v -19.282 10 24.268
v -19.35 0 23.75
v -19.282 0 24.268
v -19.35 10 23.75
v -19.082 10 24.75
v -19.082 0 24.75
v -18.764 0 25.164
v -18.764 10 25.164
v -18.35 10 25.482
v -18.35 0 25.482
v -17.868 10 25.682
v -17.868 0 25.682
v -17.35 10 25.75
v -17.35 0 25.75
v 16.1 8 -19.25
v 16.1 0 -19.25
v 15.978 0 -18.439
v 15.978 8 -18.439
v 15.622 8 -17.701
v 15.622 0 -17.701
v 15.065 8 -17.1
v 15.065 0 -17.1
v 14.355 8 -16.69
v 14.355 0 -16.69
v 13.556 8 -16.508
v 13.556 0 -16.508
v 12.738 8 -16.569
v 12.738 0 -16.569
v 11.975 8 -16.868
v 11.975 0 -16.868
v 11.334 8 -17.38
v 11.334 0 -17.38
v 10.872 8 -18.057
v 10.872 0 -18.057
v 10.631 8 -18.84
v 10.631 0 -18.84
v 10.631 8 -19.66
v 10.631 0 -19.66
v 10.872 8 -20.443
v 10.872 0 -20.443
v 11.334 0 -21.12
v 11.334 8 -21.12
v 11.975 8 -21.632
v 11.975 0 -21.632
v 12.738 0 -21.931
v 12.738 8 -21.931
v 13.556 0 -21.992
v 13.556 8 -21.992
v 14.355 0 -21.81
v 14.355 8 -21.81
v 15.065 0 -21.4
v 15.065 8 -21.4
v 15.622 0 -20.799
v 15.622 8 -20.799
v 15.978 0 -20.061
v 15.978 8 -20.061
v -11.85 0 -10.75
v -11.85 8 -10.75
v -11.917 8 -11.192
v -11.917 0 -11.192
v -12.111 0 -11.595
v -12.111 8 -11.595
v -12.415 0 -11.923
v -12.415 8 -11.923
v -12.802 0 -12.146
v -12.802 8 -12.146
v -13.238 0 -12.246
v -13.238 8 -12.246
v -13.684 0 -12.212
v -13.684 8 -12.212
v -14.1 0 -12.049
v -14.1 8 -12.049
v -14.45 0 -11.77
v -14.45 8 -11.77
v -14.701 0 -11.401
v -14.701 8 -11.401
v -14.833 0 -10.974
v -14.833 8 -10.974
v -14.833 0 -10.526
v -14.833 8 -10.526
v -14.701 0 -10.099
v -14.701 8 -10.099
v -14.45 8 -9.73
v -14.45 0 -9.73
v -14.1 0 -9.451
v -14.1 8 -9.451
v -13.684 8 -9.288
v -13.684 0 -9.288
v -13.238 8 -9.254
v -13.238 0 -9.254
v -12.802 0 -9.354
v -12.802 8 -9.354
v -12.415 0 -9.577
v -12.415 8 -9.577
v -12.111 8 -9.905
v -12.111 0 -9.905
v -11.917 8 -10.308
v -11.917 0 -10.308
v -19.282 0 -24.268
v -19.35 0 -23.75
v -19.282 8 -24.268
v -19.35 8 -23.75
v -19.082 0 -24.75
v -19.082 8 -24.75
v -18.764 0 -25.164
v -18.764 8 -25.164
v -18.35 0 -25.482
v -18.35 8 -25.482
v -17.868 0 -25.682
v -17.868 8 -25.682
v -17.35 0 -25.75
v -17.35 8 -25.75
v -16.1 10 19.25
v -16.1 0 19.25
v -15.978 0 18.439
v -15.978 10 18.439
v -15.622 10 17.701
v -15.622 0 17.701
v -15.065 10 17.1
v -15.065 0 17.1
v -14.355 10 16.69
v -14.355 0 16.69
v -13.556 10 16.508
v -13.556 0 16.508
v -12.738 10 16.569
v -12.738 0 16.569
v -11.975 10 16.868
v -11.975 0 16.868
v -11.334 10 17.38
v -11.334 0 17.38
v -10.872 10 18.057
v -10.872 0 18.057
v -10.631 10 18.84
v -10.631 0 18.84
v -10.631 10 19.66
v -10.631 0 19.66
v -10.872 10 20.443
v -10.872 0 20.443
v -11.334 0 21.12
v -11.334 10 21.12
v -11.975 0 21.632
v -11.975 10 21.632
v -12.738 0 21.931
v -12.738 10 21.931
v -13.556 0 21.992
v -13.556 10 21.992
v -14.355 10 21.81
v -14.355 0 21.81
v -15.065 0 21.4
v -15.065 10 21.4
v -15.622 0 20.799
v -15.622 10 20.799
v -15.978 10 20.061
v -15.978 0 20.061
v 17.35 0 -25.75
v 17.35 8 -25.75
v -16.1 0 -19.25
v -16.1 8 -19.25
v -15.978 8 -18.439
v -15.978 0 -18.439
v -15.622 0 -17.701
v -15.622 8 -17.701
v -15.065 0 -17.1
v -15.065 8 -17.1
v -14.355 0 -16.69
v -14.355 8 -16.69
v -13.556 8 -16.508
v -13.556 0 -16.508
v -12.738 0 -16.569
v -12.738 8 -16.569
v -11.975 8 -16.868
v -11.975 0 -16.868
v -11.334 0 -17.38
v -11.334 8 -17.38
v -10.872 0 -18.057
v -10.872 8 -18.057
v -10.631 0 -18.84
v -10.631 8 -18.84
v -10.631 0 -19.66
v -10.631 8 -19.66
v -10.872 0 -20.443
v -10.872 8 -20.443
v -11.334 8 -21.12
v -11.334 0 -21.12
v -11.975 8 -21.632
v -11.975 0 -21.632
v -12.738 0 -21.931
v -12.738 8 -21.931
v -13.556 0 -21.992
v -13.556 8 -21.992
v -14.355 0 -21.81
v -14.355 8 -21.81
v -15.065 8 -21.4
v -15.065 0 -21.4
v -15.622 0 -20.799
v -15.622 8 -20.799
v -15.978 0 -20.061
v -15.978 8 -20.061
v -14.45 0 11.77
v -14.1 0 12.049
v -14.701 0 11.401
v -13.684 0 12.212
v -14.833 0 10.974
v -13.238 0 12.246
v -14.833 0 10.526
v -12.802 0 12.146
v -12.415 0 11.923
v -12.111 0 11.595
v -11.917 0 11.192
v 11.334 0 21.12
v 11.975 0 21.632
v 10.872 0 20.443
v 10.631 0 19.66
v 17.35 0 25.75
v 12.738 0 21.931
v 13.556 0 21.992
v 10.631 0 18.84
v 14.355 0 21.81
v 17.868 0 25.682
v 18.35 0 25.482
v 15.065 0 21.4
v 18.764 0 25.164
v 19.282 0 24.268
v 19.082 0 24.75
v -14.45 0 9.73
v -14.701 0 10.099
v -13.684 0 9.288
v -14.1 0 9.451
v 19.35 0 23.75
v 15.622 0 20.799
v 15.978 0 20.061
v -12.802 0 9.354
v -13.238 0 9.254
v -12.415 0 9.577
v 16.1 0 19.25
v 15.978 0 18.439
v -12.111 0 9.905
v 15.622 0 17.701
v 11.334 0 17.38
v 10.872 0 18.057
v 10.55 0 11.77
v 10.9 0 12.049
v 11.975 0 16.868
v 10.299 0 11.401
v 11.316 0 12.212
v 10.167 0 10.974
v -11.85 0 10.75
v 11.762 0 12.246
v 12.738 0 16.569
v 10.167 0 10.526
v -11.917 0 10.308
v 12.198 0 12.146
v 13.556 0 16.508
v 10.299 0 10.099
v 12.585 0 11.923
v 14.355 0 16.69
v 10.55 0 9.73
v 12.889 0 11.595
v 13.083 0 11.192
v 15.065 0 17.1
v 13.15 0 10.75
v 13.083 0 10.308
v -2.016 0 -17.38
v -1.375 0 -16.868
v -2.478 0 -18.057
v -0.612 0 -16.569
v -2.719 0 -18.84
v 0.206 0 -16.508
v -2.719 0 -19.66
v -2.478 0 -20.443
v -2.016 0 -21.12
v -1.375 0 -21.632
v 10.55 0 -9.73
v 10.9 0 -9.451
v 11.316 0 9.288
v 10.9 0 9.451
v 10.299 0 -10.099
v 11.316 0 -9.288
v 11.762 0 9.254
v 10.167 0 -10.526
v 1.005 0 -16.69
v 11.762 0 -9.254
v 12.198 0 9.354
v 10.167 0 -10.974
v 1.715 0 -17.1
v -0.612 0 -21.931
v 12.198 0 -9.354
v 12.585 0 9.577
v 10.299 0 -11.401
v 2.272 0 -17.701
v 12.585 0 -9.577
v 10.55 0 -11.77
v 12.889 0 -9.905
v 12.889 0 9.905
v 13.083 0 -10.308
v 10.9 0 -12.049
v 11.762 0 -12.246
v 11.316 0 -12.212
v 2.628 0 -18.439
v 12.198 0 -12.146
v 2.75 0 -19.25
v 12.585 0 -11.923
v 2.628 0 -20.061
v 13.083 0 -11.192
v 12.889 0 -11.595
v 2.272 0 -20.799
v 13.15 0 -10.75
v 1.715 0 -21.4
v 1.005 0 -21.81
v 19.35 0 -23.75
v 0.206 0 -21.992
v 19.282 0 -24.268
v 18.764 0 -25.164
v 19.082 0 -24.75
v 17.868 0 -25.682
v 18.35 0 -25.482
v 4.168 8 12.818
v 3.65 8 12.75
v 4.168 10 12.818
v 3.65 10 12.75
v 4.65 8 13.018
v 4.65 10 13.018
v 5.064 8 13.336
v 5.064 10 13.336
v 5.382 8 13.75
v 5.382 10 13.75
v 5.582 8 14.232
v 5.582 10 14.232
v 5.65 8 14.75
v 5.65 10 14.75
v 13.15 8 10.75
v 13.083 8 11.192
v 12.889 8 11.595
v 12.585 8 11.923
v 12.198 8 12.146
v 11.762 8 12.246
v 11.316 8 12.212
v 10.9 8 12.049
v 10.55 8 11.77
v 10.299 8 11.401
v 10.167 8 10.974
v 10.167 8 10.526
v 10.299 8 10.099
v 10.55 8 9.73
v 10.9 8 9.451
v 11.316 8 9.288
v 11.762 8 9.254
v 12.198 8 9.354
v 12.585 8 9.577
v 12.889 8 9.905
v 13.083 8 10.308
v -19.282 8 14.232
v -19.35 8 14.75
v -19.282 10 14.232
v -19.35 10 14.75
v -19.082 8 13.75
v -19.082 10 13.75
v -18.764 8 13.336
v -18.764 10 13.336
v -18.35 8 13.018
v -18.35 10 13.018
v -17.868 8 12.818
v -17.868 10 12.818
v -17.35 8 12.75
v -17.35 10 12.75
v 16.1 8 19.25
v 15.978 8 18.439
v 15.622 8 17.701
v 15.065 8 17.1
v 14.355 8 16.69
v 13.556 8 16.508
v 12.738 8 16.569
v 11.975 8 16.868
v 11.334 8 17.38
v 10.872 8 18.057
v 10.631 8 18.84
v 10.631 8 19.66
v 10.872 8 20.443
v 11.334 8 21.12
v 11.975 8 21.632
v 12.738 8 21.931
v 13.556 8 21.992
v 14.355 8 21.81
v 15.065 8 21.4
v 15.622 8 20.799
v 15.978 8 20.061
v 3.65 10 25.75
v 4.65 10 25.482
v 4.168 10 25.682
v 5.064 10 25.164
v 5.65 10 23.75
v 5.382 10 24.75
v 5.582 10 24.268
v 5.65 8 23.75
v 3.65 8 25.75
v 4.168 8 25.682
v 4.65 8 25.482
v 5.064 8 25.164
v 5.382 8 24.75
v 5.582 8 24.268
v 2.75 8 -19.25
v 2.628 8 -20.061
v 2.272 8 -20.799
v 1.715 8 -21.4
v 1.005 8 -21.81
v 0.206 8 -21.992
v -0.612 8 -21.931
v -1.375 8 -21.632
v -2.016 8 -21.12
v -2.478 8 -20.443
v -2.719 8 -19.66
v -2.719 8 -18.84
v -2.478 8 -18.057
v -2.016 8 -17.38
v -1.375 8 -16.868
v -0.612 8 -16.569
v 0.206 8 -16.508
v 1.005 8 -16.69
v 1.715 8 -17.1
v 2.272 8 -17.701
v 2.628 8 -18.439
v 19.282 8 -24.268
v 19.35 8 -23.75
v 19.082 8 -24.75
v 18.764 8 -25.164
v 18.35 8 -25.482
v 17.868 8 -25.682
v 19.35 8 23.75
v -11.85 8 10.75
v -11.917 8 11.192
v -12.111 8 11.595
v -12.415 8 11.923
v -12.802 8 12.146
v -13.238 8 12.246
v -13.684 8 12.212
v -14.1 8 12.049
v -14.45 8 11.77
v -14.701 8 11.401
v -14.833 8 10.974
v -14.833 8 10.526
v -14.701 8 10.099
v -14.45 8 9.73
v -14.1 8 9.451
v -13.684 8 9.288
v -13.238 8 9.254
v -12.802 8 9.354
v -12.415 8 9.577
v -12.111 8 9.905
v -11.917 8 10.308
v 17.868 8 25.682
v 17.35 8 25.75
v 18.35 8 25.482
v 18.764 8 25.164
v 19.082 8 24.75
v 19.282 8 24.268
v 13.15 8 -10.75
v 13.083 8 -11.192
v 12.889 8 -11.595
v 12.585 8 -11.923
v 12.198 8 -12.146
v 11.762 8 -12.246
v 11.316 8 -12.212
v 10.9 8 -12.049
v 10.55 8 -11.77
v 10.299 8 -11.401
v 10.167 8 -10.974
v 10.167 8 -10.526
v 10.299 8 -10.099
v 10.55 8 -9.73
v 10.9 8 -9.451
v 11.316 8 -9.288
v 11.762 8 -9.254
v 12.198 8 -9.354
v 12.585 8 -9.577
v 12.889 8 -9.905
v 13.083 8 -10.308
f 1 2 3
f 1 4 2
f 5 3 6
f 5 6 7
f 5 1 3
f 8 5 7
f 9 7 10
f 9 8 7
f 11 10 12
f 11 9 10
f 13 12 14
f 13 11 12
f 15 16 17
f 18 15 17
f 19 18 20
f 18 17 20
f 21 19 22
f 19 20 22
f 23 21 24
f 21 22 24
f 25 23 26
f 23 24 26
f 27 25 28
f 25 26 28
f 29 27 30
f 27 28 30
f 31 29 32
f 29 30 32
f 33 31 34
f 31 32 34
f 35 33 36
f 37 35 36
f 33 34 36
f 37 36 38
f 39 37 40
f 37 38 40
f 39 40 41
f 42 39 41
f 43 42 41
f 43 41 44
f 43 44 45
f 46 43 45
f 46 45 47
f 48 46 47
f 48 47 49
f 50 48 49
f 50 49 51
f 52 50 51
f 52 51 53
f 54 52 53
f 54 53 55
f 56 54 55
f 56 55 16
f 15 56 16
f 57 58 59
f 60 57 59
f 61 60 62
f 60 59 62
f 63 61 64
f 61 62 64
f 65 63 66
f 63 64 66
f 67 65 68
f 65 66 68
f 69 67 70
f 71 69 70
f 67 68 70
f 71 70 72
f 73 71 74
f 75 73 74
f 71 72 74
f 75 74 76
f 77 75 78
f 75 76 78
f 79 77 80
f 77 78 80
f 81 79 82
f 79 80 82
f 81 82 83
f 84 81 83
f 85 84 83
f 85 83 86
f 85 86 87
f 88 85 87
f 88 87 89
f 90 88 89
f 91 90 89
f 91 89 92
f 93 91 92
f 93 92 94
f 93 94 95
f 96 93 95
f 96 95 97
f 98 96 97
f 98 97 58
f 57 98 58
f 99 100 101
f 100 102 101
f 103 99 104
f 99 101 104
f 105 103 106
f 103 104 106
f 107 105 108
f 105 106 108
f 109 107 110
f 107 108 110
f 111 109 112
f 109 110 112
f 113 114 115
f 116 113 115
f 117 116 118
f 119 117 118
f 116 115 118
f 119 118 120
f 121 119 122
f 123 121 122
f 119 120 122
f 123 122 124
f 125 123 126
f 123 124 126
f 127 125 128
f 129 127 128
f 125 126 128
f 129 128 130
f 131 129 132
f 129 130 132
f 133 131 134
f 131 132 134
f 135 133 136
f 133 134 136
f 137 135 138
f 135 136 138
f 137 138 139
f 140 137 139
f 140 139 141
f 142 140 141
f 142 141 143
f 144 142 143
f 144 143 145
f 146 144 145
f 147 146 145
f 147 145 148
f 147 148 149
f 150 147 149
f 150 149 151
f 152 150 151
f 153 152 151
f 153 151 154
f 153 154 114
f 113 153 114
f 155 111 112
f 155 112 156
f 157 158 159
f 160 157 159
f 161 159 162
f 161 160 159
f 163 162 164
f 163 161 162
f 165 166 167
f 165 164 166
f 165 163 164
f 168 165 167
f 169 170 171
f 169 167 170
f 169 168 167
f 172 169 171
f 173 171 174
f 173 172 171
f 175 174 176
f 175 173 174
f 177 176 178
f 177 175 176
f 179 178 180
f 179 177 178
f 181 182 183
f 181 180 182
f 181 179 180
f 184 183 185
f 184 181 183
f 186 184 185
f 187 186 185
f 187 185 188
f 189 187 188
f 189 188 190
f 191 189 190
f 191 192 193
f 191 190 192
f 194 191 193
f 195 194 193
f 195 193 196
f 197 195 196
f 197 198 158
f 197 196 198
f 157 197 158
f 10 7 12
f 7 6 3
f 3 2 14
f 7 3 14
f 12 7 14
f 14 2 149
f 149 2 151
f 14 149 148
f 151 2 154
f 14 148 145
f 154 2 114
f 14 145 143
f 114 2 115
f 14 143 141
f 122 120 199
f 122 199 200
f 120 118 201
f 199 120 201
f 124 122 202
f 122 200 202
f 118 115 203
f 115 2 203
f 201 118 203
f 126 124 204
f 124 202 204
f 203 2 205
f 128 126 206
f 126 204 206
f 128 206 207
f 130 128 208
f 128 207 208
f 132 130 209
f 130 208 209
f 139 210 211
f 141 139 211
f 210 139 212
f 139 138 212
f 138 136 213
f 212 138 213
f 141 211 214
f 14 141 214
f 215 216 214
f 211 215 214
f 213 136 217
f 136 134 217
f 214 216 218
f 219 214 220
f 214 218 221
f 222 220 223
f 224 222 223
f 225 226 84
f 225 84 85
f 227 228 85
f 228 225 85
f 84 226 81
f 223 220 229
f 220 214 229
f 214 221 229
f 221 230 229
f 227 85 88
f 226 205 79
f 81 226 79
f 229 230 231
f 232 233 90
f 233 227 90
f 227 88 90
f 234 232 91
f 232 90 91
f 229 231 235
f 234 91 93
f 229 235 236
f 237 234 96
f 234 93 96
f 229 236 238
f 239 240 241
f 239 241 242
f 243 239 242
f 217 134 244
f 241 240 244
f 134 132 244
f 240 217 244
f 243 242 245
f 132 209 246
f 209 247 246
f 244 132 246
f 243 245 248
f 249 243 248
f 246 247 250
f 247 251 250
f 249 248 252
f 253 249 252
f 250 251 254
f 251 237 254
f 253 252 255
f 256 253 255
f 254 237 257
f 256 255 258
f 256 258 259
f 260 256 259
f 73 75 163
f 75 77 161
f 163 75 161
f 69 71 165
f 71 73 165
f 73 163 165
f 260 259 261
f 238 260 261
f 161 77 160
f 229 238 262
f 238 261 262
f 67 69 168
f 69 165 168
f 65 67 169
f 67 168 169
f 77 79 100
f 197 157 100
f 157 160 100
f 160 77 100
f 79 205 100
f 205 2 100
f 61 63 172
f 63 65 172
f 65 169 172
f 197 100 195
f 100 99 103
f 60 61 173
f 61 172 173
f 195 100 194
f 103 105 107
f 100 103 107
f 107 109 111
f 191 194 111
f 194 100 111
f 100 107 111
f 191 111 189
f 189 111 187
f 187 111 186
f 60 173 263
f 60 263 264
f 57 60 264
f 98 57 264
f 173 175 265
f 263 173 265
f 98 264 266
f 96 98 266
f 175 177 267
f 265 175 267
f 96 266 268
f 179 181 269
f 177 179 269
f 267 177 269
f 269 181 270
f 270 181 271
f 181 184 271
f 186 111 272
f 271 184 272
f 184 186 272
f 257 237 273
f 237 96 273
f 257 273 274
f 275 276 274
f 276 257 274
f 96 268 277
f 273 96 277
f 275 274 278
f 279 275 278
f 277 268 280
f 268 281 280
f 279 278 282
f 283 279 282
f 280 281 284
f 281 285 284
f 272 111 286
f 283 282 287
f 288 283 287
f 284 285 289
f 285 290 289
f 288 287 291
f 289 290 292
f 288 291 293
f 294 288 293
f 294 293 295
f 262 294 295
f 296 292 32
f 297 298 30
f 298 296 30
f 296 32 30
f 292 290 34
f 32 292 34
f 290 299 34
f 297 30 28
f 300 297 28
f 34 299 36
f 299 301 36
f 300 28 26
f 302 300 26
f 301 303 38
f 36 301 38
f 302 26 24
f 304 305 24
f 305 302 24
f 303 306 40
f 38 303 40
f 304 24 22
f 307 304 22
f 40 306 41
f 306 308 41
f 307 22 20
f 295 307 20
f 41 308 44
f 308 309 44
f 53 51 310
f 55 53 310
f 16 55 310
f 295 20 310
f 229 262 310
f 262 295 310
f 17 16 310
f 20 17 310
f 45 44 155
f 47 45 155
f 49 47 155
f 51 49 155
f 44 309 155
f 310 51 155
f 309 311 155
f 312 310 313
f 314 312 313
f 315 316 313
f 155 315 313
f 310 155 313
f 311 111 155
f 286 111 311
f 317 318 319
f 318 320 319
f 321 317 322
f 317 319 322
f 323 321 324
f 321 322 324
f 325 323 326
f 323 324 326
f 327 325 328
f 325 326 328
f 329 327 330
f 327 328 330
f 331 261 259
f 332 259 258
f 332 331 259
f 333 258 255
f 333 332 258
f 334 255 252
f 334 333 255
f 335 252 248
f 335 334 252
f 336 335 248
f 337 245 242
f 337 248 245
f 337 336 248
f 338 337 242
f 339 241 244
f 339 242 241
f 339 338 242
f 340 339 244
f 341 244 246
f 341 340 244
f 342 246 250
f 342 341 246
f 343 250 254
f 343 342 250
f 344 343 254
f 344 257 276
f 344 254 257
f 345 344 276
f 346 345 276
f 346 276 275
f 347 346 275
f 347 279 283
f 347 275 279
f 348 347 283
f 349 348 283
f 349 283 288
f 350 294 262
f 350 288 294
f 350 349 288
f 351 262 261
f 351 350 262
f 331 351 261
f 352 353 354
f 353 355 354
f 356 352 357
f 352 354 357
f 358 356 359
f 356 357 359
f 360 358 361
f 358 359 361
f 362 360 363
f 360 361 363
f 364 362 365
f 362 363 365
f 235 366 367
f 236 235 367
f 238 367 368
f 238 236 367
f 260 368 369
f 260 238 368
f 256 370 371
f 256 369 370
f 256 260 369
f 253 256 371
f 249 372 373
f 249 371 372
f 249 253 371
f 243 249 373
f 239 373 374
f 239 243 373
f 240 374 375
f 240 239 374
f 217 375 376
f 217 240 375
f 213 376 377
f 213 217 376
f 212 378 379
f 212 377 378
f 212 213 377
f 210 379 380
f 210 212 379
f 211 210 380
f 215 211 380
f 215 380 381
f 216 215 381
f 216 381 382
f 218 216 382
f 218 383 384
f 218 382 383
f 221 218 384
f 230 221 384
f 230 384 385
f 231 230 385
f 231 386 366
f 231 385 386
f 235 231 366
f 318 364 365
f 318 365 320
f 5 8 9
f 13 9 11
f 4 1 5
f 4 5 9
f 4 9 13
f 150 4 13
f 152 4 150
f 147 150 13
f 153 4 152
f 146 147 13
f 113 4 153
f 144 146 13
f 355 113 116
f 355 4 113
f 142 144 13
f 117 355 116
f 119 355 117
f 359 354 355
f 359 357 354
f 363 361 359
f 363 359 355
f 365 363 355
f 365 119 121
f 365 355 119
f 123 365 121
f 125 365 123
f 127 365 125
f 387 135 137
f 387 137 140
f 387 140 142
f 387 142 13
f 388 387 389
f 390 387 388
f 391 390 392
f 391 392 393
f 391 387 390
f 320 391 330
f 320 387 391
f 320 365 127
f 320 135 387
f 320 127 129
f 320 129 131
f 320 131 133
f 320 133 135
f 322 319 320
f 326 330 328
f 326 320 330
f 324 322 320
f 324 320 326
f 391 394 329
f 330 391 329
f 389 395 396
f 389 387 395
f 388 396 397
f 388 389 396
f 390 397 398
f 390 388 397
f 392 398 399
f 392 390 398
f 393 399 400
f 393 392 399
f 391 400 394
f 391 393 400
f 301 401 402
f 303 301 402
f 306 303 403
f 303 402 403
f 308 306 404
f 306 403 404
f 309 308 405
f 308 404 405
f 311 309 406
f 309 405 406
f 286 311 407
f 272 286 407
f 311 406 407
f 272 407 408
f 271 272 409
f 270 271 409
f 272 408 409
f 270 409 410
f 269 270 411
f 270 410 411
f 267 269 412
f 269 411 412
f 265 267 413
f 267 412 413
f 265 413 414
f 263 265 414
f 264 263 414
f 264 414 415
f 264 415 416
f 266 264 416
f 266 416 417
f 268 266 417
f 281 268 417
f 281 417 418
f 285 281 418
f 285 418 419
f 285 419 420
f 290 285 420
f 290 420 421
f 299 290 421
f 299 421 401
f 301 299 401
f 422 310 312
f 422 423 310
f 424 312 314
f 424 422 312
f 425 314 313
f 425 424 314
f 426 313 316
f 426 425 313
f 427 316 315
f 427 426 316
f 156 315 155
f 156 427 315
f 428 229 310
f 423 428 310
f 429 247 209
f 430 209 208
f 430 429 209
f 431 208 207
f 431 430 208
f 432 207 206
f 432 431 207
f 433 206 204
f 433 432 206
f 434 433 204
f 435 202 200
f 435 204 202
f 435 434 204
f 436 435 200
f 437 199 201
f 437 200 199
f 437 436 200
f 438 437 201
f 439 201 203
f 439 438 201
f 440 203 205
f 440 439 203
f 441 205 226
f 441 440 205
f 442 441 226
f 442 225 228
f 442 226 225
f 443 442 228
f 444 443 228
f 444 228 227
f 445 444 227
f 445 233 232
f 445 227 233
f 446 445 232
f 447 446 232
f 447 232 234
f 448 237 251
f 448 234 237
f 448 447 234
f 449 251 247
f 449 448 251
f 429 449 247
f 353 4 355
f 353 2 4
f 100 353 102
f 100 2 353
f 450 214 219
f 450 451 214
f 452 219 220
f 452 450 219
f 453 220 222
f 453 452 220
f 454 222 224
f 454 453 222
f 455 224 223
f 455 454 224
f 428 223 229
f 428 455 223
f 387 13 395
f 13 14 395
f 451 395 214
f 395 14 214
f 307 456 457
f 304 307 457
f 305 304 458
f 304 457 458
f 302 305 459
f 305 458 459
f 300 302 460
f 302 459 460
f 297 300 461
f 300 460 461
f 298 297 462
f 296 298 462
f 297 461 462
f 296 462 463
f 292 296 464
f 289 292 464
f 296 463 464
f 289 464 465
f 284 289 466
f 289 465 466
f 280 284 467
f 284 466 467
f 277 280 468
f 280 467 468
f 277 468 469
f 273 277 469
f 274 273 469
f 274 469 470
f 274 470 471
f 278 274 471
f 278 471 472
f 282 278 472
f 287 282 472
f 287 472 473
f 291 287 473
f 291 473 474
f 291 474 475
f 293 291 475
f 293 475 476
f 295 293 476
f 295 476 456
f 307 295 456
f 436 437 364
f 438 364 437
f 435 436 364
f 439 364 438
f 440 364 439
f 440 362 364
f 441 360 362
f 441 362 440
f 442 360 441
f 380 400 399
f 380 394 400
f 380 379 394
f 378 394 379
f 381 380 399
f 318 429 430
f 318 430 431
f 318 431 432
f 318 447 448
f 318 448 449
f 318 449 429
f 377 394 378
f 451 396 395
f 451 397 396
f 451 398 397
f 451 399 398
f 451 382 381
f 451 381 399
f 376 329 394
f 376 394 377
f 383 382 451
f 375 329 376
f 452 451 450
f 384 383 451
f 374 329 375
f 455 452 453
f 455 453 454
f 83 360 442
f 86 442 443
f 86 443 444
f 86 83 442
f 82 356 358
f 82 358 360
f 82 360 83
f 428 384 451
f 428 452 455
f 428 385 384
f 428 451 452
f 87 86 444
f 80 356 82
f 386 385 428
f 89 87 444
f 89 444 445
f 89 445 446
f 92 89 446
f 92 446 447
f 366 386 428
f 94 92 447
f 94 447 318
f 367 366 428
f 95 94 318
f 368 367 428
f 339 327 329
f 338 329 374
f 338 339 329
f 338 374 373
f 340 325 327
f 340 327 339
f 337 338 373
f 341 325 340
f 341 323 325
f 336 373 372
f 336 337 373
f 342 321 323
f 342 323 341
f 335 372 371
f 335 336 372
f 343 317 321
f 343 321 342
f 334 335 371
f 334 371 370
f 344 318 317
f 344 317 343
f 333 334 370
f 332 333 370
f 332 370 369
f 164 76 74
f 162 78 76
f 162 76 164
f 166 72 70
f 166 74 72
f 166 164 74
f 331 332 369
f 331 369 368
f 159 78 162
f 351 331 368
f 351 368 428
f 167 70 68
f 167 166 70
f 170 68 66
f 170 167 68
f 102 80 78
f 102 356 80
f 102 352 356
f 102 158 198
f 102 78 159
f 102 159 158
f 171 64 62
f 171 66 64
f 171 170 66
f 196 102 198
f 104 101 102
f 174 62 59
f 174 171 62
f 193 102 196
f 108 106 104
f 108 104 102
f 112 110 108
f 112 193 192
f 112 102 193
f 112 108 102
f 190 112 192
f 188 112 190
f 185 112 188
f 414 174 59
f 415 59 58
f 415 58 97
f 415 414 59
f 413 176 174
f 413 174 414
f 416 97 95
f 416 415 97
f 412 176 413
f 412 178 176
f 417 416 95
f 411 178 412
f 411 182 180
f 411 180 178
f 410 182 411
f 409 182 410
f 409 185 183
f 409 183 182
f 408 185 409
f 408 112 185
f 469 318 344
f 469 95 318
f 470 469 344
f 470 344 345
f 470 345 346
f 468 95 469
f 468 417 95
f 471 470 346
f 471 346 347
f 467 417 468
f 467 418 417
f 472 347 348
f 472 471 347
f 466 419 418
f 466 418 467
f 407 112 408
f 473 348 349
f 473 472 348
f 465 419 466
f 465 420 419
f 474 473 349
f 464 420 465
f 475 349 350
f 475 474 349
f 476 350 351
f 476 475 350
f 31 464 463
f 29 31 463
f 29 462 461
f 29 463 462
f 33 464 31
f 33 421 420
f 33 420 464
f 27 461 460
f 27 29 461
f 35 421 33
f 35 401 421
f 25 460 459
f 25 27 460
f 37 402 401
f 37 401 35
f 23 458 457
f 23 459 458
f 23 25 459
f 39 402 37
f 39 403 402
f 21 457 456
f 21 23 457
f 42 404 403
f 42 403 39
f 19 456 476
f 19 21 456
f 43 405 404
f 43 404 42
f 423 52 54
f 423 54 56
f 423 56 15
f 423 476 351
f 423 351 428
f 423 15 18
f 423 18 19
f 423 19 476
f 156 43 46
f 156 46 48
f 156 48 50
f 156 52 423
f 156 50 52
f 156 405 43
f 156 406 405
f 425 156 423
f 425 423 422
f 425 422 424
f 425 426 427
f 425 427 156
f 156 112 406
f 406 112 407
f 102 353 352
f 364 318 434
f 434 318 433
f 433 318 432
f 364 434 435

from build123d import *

# Parameters (mm, degrees)
SKETCH1_W               = 38.7
SKETCH1_H               = 51.5
BOSS_EXTRUDE1_DEPTH     = 8
SKETCH2_R               = 1.5
CUT_EXTRUDE1_DEPTH      = 9
SKETCH6_W               = 25
SKETCH6_H               = 13
BOSS_EXTRUDE3_DEPTH     = 2
CUT_EXTRUDE2_START      = -9
SKETCH3_R               = 2.75
CUT_EXTRUDE2_DEPTH      = 12
MIRROR3_START           = -9
MIRROR3_COPY_1_SKETCH_R = 2.75
MIRROR3_COPY_1_DEPTH    = 12
SKETCH4_R               = 2.75
CUT_EXTRUDE3_DEPTH      = 3
CUT_EXTRUDE3_DEPTH_BACK = 9
FILLET1_R               = 2
FILLET2_R               = 2


with BuildPart() as part:
    # Sketch1 → Boss-Extrude1 (new body)
    with BuildSketch(Plane(origin=(0, 0, 0), x_dir=(1, 0, 0), z_dir=(0, 1, 0))):
        Rectangle(SKETCH1_W, SKETCH1_H)
    extrude(amount=BOSS_EXTRUDE1_DEPTH)

    # Sketch2 → Cut-Extrude1 (cut, through all)
    with BuildSketch(Plane(origin=(0, 8, 0), x_dir=(1, 0, 0), z_dir=(0, 1, 0))):
        with Locations((11.65, 10.75)):
            Circle(SKETCH2_R)
        with Locations((-13.35, 10.75)):
            Circle(SKETCH2_R)
    cut_extrude1 = extrude(amount=-CUT_EXTRUDE1_DEPTH, mode=Mode.SUBTRACT)

    # Mirror1: Cut-Extrude1 across plane
    add(cut_extrude1.mirror(Plane.XY), mode=Mode.SUBTRACT)

    # Sketch6 → Boss-Extrude3 (add)
    with BuildSketch(Plane(origin=(0, 8, 0), x_dir=(1, 0, 0), z_dir=(0, 1, 0))):
        with Locations((-6.85, -19.25)):
            Rectangle(SKETCH6_W, SKETCH6_H)
    extrude(amount=BOSS_EXTRUDE3_DEPTH)

    # Sketch3 → Cut-Extrude2 (cut)
    with BuildSketch(Plane(origin=(0, 8, 0), x_dir=(1, 0, 0), z_dir=(0, 1, 0)).offset(CUT_EXTRUDE2_START)):
        with Locations((13.35, -19.25)):
            Circle(SKETCH3_R)
    cut_extrude2 = extrude(amount=CUT_EXTRUDE2_DEPTH, mode=Mode.SUBTRACT)

    # Mirror2: Cut-Extrude2 across plane
    add(cut_extrude2.mirror(Plane(origin=(0, 0, 0), x_dir=(0, 0, 1), z_dir=(1, 0, 0))), mode=Mode.SUBTRACT)

    # Mirror3: Cut-Extrude2 across plane
    add(cut_extrude2.mirror(Plane.XY), mode=Mode.SUBTRACT)

    # Mirror3 copy 1 sketch → Mirror3 copy 1 (cut)
    with BuildSketch(Plane(origin=(0, 8, 0), x_dir=(-1, 0, 0), z_dir=(0, 1, 0)).offset(MIRROR3_START)):
        with Locations((13.35, -19.25)):
            Circle(MIRROR3_COPY_1_SKETCH_R)
    extrude(amount=MIRROR3_COPY_1_DEPTH, mode=Mode.SUBTRACT)

    # Sketch4 → Cut-Extrude3 (cut, two sides)
    with BuildSketch(Plane(origin=(0, 8, 0), x_dir=(1, 0, 0), z_dir=(0, 1, 0))) as cut_extrude3_sk:
        with Locations((0, 19.25)):
            Circle(SKETCH4_R)
    extrude(amount=CUT_EXTRUDE3_DEPTH, mode=Mode.SUBTRACT)
    extrude(cut_extrude3_sk.sketch, amount=-CUT_EXTRUDE3_DEPTH_BACK, mode=Mode.SUBTRACT)

    # Fillet1
    fillet1_edges = [part.edges().sort_by_distance(p)[0] for p in [
        (5.65, 9, 25.75),
        (5.65, 9, 12.75),
        (-19.35, 9, 12.75),
    ]]
    fillet(fillet1_edges, radius=FILLET1_R)

    # Fillet2
    fillet2_edges = [part.edges().sort_by_distance(p)[0] for p in [
        (19.35, 4, 25.75),
        (-19.35, 5, 25.75),
        (-19.35, 4, -25.75),
        (19.35, 4, -25.75),
    ]]
    fillet(fillet2_edges, radius=FILLET2_R)


solid = part.part
